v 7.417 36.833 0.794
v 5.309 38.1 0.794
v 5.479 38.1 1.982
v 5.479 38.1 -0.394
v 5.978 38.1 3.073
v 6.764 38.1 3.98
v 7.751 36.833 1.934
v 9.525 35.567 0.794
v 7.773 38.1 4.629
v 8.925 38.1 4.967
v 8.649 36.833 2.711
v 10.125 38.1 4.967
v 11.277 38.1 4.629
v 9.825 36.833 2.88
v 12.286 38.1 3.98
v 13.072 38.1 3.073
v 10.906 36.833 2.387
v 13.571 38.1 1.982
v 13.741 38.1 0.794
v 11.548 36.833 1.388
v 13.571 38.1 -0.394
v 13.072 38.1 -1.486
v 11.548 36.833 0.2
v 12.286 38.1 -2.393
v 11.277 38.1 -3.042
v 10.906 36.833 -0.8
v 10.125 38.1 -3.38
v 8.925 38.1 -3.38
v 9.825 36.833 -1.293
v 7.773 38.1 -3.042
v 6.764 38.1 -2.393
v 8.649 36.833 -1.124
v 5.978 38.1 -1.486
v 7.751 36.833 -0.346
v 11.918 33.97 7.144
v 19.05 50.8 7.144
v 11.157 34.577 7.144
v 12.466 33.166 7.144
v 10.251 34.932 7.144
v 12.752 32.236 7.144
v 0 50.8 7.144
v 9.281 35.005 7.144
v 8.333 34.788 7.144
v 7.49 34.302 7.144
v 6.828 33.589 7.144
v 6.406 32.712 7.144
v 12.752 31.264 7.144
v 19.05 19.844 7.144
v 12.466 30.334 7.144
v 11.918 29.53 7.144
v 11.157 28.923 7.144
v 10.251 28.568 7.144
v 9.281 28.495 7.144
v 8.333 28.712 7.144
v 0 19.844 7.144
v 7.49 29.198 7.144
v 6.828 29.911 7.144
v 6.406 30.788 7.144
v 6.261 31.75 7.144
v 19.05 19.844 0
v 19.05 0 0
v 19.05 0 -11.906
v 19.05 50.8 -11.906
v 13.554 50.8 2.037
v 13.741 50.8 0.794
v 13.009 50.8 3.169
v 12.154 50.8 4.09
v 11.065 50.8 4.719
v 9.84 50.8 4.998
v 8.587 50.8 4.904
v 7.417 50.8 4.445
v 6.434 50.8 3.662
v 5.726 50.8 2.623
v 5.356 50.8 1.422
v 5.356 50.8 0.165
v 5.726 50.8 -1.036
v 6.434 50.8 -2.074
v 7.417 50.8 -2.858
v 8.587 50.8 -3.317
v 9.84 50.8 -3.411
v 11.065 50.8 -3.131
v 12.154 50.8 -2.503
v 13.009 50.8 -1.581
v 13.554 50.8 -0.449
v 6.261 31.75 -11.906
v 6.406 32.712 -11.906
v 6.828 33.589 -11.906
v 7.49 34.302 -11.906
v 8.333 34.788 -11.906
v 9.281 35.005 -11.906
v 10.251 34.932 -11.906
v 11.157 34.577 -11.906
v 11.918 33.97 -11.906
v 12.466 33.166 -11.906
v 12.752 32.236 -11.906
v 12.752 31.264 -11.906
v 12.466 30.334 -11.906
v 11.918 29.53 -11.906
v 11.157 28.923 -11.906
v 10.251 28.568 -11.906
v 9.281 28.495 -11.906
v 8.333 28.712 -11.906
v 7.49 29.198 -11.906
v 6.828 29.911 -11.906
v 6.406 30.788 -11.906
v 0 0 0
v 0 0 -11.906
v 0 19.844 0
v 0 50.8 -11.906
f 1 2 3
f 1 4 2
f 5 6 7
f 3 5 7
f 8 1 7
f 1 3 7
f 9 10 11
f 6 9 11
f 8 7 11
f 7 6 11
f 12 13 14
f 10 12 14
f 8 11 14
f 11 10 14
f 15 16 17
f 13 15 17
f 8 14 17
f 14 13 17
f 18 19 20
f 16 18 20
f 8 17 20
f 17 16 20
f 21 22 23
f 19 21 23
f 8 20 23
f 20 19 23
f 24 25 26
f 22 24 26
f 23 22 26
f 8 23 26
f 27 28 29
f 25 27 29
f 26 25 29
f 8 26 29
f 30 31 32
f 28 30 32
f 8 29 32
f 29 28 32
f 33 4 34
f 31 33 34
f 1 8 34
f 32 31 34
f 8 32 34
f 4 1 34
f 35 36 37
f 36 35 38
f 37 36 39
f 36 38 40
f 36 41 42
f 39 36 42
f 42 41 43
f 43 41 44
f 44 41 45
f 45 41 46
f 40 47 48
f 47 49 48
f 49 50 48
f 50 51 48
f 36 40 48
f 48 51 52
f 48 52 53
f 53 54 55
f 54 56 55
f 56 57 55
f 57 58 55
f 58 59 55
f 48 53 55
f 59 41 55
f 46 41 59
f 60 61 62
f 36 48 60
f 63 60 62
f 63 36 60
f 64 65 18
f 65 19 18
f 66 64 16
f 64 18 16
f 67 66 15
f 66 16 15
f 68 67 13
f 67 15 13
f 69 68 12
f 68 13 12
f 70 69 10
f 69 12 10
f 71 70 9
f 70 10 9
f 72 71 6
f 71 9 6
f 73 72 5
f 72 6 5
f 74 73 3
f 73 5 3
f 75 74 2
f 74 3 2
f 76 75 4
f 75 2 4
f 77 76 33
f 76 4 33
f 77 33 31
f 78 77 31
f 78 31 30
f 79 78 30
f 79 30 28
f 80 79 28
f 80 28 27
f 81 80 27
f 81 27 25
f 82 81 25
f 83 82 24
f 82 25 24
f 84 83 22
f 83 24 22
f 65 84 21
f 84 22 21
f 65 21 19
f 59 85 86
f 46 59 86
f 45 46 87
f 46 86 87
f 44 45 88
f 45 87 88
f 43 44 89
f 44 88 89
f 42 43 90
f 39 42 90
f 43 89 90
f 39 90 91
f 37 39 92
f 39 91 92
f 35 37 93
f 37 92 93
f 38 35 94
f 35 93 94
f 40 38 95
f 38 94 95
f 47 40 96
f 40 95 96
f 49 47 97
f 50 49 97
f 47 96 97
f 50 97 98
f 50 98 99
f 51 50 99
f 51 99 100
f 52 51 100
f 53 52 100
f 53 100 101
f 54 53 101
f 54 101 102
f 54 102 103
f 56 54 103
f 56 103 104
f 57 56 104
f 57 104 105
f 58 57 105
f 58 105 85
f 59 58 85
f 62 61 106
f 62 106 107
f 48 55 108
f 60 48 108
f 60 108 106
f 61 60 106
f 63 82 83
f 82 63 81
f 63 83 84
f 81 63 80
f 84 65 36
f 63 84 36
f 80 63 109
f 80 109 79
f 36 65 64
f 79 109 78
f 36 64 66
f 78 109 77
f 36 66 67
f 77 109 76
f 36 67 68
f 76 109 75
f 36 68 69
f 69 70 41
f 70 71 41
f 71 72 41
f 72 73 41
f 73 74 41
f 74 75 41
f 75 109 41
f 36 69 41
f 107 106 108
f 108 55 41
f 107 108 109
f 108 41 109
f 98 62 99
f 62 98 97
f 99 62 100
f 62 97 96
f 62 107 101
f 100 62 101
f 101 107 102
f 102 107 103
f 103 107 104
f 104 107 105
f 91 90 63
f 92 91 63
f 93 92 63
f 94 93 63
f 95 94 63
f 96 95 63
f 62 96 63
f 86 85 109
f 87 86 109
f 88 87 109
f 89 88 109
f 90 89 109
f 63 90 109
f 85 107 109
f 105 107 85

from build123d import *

# Parameters (mm, degrees)
EXTRUDE1_DEPTH              = 19.05
F_5_16_18_TAPPED_HOLE1_D    = 6.5278
F_3_8_24_TAPPED_HOLE1_D     = 8.4328
F_3_8_24_TAPPED_HOLE1_DEPTH = 12.7
F_3_8_24_TAPPED_HOLE1_TIP   = 2.533468714


with BuildPart() as part:
    # Sketch1 → Extrude1 (new body)
    with BuildSketch(Plane(origin=(0, 0, 0), x_dir=(0, 0, -1), z_dir=(1, 0, 0))):
        Polygon((0, 0), (11.90625, 0), (11.90625, 50.8), (-7.14375, 50.8), (-7.14375, 19.84375), (0, 19.84375), align=None)
    extrude(amount=EXTRUDE1_DEPTH)

    # 5/16-18 Tapped Hole1 (through all)
    with Locations(Plane.XY.offset(7.14375)):
        with Locations((9.525, 31.75)):
            Hole(F_5_16_18_TAPPED_HOLE1_D / 2)

    # 3/8-24 Tapped Hole1
    with Locations(Plane(origin=(0, 50.8, 0), x_dir=(-1, 0, 0), z_dir=(0, 1, 0))):
        with Locations((-9.525, 0.79375)):
            Hole(F_3_8_24_TAPPED_HOLE1_D / 2, depth=F_3_8_24_TAPPED_HOLE1_DEPTH)
            with Locations((0, 0, -(F_3_8_24_TAPPED_HOLE1_DEPTH + F_3_8_24_TAPPED_HOLE1_TIP / 2))):  # 118° drill point
                Cone(0, F_3_8_24_TAPPED_HOLE1_D / 2, F_3_8_24_TAPPED_HOLE1_TIP, mode=Mode.SUBTRACT)


solid = part.part
